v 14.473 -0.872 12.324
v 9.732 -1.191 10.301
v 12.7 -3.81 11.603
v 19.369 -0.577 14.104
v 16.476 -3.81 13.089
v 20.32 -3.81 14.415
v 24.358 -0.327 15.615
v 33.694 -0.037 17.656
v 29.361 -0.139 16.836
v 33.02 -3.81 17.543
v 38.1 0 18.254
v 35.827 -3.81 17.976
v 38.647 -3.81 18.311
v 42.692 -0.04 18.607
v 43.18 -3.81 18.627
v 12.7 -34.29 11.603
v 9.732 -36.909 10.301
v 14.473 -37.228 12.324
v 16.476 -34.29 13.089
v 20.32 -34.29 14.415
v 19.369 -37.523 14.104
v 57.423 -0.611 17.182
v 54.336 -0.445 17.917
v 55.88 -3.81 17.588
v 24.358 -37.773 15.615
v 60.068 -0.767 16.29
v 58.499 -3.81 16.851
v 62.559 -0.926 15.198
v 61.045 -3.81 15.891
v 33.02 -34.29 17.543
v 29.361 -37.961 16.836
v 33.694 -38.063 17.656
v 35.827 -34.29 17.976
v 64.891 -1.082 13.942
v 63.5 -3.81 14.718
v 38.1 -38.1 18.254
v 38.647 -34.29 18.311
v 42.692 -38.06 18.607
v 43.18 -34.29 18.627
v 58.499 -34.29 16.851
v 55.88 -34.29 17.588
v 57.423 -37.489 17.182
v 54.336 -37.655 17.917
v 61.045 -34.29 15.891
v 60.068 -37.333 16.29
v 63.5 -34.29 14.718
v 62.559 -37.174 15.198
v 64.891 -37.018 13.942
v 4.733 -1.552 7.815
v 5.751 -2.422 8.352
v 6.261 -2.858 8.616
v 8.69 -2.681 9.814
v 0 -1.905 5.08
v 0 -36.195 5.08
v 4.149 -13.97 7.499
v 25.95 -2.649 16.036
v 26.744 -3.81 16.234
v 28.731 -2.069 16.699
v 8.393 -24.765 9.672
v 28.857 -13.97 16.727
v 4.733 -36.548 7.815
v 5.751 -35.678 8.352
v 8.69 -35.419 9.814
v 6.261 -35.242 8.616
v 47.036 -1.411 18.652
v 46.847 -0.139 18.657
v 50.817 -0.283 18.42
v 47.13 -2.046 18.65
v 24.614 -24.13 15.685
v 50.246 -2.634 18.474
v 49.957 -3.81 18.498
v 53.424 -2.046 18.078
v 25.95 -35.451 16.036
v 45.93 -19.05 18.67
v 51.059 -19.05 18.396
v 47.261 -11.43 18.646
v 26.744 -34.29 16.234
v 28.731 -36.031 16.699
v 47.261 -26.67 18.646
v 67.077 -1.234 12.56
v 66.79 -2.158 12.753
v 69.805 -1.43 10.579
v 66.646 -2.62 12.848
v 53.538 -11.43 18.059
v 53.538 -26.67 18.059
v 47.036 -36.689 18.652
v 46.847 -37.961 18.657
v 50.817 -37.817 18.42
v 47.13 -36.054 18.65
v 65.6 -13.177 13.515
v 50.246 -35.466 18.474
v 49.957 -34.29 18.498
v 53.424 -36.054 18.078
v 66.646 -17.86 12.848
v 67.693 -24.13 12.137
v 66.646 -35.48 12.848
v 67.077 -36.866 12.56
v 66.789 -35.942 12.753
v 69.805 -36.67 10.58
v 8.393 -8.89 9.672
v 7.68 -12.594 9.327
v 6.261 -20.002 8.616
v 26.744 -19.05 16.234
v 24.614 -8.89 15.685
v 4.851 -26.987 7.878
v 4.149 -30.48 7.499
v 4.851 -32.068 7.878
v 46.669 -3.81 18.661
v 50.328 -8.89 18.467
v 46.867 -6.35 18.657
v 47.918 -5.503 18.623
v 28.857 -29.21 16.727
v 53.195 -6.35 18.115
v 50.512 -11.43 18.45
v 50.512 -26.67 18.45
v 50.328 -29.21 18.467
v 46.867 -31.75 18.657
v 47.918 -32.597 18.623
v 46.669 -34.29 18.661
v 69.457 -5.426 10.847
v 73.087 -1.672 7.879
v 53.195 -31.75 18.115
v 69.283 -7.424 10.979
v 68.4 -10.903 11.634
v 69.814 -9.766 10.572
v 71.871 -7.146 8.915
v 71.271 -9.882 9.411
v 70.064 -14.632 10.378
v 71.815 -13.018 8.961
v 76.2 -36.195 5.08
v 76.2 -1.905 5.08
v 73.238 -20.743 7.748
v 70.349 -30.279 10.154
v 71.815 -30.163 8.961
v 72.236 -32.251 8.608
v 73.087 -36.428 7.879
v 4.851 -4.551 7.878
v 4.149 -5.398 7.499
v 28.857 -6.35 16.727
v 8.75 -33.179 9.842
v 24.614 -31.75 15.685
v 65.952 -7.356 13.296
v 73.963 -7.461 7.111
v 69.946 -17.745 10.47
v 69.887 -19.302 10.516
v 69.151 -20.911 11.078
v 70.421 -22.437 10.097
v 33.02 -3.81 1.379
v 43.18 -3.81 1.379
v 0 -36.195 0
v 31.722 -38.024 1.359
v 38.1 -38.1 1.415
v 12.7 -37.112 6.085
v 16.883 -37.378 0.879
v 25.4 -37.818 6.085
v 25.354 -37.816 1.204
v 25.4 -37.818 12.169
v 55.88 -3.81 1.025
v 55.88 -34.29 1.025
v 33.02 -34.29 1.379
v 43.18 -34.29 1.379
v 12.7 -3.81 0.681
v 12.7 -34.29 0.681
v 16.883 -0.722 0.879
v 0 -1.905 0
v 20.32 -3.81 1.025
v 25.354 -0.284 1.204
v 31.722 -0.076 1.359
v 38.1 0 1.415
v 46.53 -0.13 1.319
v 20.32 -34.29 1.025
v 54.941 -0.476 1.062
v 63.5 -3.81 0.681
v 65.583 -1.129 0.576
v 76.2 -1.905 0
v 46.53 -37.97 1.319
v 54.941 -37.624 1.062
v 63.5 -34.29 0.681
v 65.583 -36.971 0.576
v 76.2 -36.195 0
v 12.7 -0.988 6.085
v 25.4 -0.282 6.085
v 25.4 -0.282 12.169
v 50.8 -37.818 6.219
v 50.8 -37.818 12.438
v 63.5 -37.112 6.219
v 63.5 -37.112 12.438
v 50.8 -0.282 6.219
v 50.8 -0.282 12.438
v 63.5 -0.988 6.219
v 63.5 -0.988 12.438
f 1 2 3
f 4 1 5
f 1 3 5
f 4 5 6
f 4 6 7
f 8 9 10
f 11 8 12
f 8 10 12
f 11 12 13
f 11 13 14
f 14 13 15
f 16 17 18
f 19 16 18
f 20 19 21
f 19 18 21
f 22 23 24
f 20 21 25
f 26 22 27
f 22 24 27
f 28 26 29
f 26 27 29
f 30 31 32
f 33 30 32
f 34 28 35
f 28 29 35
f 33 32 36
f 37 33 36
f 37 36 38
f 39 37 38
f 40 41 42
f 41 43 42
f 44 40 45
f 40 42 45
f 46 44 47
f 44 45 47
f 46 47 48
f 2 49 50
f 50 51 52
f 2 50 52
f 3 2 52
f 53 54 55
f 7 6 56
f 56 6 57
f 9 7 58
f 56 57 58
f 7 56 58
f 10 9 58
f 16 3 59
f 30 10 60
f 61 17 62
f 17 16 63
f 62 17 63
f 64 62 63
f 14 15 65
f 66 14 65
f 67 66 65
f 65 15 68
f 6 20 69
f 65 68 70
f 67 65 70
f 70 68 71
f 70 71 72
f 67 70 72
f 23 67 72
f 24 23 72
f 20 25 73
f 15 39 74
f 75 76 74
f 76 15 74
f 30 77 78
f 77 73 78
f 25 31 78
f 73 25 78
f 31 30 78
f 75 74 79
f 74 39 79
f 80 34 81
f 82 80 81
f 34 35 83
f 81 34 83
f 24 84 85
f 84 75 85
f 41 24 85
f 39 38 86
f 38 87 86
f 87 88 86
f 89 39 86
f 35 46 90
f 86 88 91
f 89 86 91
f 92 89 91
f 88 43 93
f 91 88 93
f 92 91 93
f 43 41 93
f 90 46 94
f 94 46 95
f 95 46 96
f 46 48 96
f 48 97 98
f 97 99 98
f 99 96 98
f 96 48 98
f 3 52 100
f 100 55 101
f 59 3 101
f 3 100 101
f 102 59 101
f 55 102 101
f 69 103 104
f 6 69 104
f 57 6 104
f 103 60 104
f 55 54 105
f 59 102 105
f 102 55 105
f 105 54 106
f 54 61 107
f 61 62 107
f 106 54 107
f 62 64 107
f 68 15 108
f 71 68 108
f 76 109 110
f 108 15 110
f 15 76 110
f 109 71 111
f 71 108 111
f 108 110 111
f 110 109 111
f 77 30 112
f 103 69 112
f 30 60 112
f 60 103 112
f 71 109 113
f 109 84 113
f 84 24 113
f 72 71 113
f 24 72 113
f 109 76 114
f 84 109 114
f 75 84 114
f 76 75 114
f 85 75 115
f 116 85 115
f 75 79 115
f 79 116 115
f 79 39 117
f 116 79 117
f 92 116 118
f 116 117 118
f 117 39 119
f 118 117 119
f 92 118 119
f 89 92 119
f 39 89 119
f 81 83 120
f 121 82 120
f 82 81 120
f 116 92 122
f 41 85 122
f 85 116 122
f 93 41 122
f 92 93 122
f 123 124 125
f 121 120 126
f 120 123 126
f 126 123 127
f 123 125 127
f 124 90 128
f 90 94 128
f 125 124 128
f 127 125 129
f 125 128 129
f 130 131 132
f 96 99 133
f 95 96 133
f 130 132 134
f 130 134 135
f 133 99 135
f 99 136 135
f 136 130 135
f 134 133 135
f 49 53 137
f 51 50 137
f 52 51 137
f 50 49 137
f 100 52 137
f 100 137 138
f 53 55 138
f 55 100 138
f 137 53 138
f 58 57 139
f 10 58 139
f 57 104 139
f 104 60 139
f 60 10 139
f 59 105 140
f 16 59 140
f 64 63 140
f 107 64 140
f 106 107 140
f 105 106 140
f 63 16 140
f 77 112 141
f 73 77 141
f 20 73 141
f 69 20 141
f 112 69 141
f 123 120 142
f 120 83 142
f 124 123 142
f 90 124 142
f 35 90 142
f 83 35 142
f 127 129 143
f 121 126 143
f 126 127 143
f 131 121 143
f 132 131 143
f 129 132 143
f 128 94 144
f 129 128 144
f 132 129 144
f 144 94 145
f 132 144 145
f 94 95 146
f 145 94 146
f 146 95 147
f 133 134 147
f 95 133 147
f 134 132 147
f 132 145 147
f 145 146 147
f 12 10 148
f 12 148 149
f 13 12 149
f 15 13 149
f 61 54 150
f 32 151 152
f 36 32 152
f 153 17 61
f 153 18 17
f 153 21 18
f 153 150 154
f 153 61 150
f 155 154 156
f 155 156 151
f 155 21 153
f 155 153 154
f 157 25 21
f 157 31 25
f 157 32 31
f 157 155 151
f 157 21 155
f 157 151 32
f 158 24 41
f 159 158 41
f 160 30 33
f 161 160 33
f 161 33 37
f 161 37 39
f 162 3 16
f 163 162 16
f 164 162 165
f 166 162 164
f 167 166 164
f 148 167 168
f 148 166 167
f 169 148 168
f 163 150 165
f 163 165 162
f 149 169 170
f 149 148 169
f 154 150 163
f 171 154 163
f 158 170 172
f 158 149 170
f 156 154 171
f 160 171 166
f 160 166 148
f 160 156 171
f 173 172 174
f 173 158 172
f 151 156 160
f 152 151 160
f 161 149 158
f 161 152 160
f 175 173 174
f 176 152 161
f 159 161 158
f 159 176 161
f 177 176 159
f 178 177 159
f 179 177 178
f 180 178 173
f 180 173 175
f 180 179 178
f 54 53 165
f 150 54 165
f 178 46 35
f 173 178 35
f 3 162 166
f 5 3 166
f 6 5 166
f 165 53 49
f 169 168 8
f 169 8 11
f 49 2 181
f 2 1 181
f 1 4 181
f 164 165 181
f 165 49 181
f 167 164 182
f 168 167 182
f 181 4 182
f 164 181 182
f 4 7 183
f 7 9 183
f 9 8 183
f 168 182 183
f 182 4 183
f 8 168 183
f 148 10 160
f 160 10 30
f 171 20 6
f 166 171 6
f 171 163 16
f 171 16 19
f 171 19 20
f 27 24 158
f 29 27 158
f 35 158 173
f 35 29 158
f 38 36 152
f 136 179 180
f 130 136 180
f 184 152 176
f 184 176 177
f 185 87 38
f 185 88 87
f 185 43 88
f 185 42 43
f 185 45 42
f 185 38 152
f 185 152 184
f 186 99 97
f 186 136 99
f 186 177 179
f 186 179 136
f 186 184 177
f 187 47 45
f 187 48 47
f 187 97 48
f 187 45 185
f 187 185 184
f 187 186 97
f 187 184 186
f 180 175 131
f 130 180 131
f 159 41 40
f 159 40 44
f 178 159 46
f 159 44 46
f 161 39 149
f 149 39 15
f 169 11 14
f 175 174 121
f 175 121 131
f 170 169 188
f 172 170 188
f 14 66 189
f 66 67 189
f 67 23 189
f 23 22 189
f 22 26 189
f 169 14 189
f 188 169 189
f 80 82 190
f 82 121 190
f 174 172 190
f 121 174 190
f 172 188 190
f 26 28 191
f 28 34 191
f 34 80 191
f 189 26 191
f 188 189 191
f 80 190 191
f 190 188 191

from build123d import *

# Parameters (mm, degrees)
F5_DEPTH  = 38.1
F8_DEPTH  = 30.734
F9_W      = 7.62
F9_H      = 15.24
F9_W_2    = 10.16
F10_DEPTH = 25.4


# Not quite as in the source:
# - a feature of the source that left no trace in its solid (it failed there, or was rolled back) is left out


with BuildPart() as f5:
    # F3 (on face) → F5 (new body)
    with BuildSketch(Plane.XZ.offset(38.1)):
        with BuildLine():
            Line((0, 5.08), (0, 0))
            add(Edge.make_bspline(
                [(0, 0), (12.7, 0.707683037), (38.1, 2.1230491111), (63.5, 0.707683037), (76.2, 0)],
                knots=[0, 0, 0, 0, 0.5, 1, 1, 1, 1], degree=3))
            Line((76.2, 0), (76.2, 5.08))
            add(Edge.make_bspline(
                [(0, 5.08), (17.1016856021, 15.7050435078), (52.4364024312, 22.8591352455), (67.3437483547, 13.2911519776), (76.2, 5.08)],
                knots=[0, 0, 0, 0, 0.5766084835, 1, 1, 1, 1], degree=3))
        make_face()
    extrude(amount=-F5_DEPTH)

    # F7 (on offset) → F8 (cut)
    with BuildSketch(Plane.XY.offset(25.4)):
        with BuildLine():
            Line((0, -38.1), (38.1, -38.1))
            add(Edge.make_bspline(
                [(0, -36.195), (12.7, -37.1475), (25.4, -38.1), (38.1, -38.1)],
                knots=[0, 0, 0, 0, 0.5, 0.5, 0.5, 0.5], degree=3))
            Line((0, -36.195), (0, -38.1))
        make_face()
        with BuildLine():
            add(Edge.make_bspline(
                [(38.1, -38.1), (50.8, -38.1), (63.5, -37.1475), (76.2, -36.195)],
                knots=[0.5, 0.5, 0.5, 0.5, 1, 1, 1, 1], degree=3))
            Line((38.1, -38.1), (76.2, -38.1))
            Line((76.2, -38.1), (76.2, -36.195))
        make_face()
        with BuildLine():
            Line((76.2, 0), (38.1, 0))
            add(Edge.make_bspline(
                [(38.1, 0), (50.8, 0), (63.5, -0.9525), (76.2, -1.905)],
                knots=[0.5, 0.5, 0.5, 0.5, 1, 1, 1, 1], degree=3))
            Line((76.2, -1.905), (76.2, 0))
        make_face()
        with BuildLine():
            Line((38.1, 0), (0, 0))
            Line((0, 0), (0, -1.905))
            add(Edge.make_bspline(
                [(0, -1.905), (12.7, -0.9525), (25.4, 0), (38.1, 0)],
                knots=[0, 0, 0, 0, 0.5, 0.5, 0.5, 0.5], degree=3))
        make_face()
    extrude(amount=-F8_DEPTH, mode=Mode.SUBTRACT)

    # F9 (on offset) → F10 (cut)
    with BuildSketch(Plane.XY.offset(25.4)):
        with Locations((59.69, -11.43)):
            Rectangle(F9_W, F9_H)
        with Locations((59.69, -26.67)):
            Rectangle(F9_W, F9_H)
        with Locations((38.1, -26.67)):
            Rectangle(F9_W_2, F9_H)
        with Locations((38.1, -11.43)):
            Rectangle(F9_W_2, F9_H)
        with Locations((16.51, -26.67)):
            Rectangle(F9_W, F9_H)
        with Locations((16.51, -11.43)):
            Rectangle(F9_W, F9_H)
    extrude(amount=-F10_DEPTH, mode=Mode.SUBTRACT)


solid = f5.part
